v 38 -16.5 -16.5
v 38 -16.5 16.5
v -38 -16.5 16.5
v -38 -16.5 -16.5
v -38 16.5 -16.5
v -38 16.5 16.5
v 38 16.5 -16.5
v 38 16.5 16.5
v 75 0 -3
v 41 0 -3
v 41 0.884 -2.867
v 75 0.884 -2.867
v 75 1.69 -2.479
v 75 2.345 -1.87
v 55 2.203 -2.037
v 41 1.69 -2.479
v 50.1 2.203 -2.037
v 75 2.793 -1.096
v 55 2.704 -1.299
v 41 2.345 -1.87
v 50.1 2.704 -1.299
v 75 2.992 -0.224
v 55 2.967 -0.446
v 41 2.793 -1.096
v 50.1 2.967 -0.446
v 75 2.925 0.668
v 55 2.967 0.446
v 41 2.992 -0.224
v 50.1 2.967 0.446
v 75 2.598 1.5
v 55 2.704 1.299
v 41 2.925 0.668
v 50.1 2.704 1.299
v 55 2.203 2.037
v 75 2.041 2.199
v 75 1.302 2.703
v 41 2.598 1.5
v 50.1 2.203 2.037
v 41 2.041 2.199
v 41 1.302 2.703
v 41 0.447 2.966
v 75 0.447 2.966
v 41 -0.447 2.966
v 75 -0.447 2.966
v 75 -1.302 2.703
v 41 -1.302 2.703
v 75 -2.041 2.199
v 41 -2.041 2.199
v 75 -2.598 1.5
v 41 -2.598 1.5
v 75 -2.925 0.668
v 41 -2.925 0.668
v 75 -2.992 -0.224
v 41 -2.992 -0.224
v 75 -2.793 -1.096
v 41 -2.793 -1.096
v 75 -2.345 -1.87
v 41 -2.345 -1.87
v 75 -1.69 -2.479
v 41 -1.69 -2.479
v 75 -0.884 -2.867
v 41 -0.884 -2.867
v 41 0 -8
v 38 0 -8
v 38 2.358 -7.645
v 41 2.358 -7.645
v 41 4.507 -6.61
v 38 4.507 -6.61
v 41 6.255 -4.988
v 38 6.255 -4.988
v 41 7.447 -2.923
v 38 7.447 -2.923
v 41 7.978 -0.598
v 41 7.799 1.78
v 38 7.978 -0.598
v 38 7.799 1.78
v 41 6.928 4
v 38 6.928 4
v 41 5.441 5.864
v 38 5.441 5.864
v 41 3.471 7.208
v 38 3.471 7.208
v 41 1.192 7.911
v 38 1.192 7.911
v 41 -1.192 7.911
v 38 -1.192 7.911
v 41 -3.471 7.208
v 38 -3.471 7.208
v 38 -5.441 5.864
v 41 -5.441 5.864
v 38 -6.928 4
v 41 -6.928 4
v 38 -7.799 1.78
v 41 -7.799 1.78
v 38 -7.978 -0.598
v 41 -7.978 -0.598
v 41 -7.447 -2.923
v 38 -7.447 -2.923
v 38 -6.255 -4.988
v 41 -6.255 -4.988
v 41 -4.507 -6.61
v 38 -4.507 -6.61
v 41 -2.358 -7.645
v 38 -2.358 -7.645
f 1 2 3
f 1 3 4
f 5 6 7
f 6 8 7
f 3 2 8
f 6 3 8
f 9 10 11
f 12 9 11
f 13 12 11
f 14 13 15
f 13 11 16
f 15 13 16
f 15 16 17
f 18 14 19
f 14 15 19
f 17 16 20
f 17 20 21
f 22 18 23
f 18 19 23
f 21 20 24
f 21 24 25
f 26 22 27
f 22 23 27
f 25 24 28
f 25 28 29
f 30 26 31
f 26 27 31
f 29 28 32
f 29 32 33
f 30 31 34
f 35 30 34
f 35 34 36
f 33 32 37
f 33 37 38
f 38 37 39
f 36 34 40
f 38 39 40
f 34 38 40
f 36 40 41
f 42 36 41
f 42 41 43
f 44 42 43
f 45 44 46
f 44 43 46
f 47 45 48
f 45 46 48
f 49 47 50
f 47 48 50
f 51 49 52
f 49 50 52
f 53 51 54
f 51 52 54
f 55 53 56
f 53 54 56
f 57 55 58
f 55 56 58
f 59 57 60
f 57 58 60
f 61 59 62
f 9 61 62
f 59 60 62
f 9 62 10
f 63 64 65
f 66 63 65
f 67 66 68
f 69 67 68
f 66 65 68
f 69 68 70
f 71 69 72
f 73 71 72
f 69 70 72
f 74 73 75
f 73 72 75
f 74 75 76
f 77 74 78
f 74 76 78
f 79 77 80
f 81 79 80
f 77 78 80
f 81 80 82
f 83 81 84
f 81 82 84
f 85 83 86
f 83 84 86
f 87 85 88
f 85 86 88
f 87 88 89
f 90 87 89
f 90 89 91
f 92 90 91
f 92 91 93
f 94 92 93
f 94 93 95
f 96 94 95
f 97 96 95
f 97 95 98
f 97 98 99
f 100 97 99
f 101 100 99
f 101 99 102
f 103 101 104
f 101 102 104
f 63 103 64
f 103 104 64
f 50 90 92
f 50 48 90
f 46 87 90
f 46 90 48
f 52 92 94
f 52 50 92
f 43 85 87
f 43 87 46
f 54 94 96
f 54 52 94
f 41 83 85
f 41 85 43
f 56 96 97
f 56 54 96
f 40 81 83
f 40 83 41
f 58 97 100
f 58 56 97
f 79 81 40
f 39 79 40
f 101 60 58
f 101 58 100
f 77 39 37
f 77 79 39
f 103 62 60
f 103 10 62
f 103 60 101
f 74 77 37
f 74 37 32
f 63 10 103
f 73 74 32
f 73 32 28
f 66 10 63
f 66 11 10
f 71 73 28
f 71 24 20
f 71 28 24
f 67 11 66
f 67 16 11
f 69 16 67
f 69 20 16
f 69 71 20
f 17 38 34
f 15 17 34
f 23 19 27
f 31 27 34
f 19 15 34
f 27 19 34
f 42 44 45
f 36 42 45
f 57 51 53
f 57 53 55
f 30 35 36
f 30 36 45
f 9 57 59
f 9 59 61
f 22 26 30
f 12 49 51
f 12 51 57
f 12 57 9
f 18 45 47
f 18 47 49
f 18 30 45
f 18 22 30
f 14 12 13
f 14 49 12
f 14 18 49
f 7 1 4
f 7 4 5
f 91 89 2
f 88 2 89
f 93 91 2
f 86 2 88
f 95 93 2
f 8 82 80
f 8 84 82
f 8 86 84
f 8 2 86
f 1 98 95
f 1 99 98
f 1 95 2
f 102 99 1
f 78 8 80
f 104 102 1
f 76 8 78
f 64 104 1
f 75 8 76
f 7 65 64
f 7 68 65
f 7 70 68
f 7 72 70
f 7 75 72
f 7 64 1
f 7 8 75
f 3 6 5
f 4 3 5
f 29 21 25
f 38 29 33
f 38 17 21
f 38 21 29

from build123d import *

# Parameters (mm, degrees)
SKETCH1_W           = 33
SKETCH1_H           = 33
BOSS_EXTRUDE1_DEPTH = 38
SKETCH2_R           = 8
BOSS_EXTRUDE2_DEPTH = 3
SKETCH3_R           = 3
BOSS_EXTRUDE3_DEPTH = 34
SKETCH4_W           = 4.9
SKETCH4_H           = 4.836057971
CUT_EXTRUDE1_DEPTH  = 17


with BuildPart() as part:
    # Sketch1 → Boss-Extrude1 (new body, symmetric)
    with BuildSketch(Plane(origin=(0, 0, 0), x_dir=(0, 0, -1), z_dir=(1, 0, 0))):
        Rectangle(SKETCH1_W, SKETCH1_H)
    extrude(amount=BOSS_EXTRUDE1_DEPTH, both=True)

    # Sketch2 → Boss-Extrude2 (add)
    with BuildSketch(Plane(origin=(38, 0, 0), x_dir=(0, 0, -1), z_dir=(1, 0, 0))):
        Circle(SKETCH2_R)
    extrude(amount=BOSS_EXTRUDE2_DEPTH)

    # Sketch3 → Boss-Extrude3 (add)
    with BuildSketch(Plane(origin=(41, 0, 0), x_dir=(0, 0, -1), z_dir=(1, 0, 0))):
        Circle(SKETCH3_R)
    extrude(amount=BOSS_EXTRUDE3_DEPTH)

    # Sketch4 → Cut-Extrude1 (cut, symmetric)
    with BuildSketch(Plane.XY):
        with Locations((52.55, 4.620557789)):
            Rectangle(SKETCH4_W, SKETCH4_H)
    extrude(amount=CUT_EXTRUDE1_DEPTH, both=True, mode=Mode.SUBTRACT)


solid = part.part
